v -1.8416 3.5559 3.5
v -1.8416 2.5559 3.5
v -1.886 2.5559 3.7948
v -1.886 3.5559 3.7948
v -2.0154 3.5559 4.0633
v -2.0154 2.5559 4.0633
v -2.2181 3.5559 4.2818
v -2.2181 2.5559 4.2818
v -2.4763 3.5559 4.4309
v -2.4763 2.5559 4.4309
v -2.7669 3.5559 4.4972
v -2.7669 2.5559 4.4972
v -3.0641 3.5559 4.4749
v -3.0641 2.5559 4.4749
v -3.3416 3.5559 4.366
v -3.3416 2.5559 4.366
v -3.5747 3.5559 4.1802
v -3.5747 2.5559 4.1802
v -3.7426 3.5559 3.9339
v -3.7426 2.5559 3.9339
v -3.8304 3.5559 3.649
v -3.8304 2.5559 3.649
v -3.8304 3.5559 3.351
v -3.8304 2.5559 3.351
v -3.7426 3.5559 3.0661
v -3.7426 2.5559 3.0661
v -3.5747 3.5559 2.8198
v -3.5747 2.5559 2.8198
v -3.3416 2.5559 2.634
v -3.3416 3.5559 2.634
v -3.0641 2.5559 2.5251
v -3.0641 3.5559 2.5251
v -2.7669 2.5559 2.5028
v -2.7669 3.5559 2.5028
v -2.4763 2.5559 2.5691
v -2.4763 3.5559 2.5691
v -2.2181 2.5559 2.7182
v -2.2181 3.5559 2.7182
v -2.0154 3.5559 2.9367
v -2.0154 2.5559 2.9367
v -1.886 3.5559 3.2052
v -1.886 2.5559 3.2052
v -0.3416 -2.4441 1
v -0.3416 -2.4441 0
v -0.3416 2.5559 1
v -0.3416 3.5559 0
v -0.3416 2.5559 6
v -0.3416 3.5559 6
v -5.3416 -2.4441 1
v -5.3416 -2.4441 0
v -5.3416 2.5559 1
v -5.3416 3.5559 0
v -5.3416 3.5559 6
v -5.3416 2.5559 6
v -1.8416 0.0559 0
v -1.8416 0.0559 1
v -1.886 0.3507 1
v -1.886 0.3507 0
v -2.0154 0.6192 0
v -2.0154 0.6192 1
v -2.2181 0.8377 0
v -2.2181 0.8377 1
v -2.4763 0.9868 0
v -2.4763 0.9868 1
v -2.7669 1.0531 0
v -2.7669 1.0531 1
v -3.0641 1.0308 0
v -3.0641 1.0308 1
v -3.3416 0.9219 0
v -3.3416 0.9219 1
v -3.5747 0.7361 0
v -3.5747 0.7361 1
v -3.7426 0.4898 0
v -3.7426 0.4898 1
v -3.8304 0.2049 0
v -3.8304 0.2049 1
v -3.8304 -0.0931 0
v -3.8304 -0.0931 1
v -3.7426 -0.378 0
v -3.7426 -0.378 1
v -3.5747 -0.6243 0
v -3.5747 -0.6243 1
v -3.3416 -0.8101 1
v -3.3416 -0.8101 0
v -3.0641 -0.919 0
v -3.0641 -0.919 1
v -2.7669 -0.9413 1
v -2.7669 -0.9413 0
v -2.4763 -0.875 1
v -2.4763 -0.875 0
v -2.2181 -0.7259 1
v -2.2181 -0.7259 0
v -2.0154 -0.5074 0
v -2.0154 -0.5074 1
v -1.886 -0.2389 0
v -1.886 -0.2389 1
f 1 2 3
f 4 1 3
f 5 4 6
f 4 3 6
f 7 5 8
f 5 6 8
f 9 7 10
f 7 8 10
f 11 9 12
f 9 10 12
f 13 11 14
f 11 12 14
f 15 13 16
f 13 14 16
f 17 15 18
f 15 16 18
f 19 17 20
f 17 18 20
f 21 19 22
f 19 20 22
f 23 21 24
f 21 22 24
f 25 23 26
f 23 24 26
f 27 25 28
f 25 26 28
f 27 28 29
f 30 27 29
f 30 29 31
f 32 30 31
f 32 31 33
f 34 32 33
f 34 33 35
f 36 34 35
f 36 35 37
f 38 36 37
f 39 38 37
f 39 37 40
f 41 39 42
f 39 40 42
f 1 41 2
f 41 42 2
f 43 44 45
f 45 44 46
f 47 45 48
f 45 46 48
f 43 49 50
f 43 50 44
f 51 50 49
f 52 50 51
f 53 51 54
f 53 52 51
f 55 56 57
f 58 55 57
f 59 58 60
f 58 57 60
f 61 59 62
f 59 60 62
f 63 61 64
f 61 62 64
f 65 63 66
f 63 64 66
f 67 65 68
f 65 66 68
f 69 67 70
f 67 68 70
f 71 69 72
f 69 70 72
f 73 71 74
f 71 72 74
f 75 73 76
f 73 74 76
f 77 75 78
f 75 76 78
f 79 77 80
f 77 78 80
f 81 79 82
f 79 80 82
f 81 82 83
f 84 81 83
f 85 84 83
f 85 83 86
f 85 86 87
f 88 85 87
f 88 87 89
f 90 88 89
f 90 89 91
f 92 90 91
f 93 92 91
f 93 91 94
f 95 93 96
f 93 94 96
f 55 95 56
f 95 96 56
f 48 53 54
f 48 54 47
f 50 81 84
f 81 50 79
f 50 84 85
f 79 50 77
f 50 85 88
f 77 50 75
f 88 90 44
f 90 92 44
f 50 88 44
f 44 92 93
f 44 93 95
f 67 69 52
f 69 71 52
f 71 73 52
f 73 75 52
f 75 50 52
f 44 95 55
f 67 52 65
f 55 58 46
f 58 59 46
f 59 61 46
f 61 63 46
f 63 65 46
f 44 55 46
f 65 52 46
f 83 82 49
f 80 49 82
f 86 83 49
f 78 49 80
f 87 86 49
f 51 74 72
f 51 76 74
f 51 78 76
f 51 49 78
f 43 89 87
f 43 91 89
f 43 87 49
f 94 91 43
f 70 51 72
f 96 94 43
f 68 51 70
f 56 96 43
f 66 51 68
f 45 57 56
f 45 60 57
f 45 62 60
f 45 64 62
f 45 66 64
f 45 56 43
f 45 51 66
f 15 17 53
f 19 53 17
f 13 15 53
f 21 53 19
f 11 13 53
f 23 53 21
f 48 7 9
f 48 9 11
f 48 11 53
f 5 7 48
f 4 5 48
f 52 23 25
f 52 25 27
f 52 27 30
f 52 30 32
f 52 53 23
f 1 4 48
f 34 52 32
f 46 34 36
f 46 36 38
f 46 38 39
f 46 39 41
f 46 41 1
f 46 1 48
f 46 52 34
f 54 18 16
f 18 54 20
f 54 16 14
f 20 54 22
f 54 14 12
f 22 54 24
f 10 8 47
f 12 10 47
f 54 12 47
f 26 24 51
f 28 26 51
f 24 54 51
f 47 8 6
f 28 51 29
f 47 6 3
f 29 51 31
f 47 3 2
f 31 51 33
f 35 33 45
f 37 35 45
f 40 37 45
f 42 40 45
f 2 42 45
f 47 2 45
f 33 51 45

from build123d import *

# Parameters (mm, degrees)
SKETCH1_W           = 5
SKETCH1_H           = 5
BOSS_EXTRUDE1_DEPTH = 1
SKETCH2_W           = 5
SKETCH2_H           = 1
BOSS_EXTRUDE2_DEPTH = 5
SKETCH3_W           = 5
SKETCH3_H           = 1
BOSS_EXTRUDE3_DEPTH = 1
SKETCH4_R           = 1
CUT_EXTRUDE1_DEPTH  = 1
SKETCH5_R           = 1
CUT_EXTRUDE2_DEPTH  = 1


with BuildPart() as part:
    # Sketch1 → Boss-Extrude1 (new body)
    with BuildSketch(Plane.XY):
        with Locations((-2.841614907, 1.055900621)):
            Rectangle(SKETCH1_W, SKETCH1_H)
    extrude(amount=BOSS_EXTRUDE1_DEPTH)

    # Sketch2 → Boss-Extrude2 (add)
    with BuildSketch(Plane.XY.offset(1)):
        with Locations((-2.841614907, 3.055900621)):
            Rectangle(SKETCH2_W, SKETCH2_H)
    extrude(amount=BOSS_EXTRUDE2_DEPTH)

    # Sketch3 → Boss-Extrude3 (add)
    with BuildSketch(Plane.XZ.offset(1.444099379)):
        with Locations((-2.841614907, 0.5)):
            Rectangle(SKETCH3_W, SKETCH3_H)
    extrude(amount=BOSS_EXTRUDE3_DEPTH)

    # Sketch4 → Cut-Extrude1 (cut)
    with BuildSketch(Plane.XY.offset(1)):
        with Locations((-2.841614907, 0.055900621)):
            Circle(SKETCH4_R)
    extrude(amount=-CUT_EXTRUDE1_DEPTH, mode=Mode.SUBTRACT)

    # Sketch5 → Cut-Extrude2 (cut)
    with BuildSketch(Plane.XZ.offset(-2.555900621)):
        with Locations((-2.841614907, 3.5)):
            Circle(SKETCH5_R)
    extrude(amount=-CUT_EXTRUDE2_DEPTH, mode=Mode.SUBTRACT)


solid = part.part
